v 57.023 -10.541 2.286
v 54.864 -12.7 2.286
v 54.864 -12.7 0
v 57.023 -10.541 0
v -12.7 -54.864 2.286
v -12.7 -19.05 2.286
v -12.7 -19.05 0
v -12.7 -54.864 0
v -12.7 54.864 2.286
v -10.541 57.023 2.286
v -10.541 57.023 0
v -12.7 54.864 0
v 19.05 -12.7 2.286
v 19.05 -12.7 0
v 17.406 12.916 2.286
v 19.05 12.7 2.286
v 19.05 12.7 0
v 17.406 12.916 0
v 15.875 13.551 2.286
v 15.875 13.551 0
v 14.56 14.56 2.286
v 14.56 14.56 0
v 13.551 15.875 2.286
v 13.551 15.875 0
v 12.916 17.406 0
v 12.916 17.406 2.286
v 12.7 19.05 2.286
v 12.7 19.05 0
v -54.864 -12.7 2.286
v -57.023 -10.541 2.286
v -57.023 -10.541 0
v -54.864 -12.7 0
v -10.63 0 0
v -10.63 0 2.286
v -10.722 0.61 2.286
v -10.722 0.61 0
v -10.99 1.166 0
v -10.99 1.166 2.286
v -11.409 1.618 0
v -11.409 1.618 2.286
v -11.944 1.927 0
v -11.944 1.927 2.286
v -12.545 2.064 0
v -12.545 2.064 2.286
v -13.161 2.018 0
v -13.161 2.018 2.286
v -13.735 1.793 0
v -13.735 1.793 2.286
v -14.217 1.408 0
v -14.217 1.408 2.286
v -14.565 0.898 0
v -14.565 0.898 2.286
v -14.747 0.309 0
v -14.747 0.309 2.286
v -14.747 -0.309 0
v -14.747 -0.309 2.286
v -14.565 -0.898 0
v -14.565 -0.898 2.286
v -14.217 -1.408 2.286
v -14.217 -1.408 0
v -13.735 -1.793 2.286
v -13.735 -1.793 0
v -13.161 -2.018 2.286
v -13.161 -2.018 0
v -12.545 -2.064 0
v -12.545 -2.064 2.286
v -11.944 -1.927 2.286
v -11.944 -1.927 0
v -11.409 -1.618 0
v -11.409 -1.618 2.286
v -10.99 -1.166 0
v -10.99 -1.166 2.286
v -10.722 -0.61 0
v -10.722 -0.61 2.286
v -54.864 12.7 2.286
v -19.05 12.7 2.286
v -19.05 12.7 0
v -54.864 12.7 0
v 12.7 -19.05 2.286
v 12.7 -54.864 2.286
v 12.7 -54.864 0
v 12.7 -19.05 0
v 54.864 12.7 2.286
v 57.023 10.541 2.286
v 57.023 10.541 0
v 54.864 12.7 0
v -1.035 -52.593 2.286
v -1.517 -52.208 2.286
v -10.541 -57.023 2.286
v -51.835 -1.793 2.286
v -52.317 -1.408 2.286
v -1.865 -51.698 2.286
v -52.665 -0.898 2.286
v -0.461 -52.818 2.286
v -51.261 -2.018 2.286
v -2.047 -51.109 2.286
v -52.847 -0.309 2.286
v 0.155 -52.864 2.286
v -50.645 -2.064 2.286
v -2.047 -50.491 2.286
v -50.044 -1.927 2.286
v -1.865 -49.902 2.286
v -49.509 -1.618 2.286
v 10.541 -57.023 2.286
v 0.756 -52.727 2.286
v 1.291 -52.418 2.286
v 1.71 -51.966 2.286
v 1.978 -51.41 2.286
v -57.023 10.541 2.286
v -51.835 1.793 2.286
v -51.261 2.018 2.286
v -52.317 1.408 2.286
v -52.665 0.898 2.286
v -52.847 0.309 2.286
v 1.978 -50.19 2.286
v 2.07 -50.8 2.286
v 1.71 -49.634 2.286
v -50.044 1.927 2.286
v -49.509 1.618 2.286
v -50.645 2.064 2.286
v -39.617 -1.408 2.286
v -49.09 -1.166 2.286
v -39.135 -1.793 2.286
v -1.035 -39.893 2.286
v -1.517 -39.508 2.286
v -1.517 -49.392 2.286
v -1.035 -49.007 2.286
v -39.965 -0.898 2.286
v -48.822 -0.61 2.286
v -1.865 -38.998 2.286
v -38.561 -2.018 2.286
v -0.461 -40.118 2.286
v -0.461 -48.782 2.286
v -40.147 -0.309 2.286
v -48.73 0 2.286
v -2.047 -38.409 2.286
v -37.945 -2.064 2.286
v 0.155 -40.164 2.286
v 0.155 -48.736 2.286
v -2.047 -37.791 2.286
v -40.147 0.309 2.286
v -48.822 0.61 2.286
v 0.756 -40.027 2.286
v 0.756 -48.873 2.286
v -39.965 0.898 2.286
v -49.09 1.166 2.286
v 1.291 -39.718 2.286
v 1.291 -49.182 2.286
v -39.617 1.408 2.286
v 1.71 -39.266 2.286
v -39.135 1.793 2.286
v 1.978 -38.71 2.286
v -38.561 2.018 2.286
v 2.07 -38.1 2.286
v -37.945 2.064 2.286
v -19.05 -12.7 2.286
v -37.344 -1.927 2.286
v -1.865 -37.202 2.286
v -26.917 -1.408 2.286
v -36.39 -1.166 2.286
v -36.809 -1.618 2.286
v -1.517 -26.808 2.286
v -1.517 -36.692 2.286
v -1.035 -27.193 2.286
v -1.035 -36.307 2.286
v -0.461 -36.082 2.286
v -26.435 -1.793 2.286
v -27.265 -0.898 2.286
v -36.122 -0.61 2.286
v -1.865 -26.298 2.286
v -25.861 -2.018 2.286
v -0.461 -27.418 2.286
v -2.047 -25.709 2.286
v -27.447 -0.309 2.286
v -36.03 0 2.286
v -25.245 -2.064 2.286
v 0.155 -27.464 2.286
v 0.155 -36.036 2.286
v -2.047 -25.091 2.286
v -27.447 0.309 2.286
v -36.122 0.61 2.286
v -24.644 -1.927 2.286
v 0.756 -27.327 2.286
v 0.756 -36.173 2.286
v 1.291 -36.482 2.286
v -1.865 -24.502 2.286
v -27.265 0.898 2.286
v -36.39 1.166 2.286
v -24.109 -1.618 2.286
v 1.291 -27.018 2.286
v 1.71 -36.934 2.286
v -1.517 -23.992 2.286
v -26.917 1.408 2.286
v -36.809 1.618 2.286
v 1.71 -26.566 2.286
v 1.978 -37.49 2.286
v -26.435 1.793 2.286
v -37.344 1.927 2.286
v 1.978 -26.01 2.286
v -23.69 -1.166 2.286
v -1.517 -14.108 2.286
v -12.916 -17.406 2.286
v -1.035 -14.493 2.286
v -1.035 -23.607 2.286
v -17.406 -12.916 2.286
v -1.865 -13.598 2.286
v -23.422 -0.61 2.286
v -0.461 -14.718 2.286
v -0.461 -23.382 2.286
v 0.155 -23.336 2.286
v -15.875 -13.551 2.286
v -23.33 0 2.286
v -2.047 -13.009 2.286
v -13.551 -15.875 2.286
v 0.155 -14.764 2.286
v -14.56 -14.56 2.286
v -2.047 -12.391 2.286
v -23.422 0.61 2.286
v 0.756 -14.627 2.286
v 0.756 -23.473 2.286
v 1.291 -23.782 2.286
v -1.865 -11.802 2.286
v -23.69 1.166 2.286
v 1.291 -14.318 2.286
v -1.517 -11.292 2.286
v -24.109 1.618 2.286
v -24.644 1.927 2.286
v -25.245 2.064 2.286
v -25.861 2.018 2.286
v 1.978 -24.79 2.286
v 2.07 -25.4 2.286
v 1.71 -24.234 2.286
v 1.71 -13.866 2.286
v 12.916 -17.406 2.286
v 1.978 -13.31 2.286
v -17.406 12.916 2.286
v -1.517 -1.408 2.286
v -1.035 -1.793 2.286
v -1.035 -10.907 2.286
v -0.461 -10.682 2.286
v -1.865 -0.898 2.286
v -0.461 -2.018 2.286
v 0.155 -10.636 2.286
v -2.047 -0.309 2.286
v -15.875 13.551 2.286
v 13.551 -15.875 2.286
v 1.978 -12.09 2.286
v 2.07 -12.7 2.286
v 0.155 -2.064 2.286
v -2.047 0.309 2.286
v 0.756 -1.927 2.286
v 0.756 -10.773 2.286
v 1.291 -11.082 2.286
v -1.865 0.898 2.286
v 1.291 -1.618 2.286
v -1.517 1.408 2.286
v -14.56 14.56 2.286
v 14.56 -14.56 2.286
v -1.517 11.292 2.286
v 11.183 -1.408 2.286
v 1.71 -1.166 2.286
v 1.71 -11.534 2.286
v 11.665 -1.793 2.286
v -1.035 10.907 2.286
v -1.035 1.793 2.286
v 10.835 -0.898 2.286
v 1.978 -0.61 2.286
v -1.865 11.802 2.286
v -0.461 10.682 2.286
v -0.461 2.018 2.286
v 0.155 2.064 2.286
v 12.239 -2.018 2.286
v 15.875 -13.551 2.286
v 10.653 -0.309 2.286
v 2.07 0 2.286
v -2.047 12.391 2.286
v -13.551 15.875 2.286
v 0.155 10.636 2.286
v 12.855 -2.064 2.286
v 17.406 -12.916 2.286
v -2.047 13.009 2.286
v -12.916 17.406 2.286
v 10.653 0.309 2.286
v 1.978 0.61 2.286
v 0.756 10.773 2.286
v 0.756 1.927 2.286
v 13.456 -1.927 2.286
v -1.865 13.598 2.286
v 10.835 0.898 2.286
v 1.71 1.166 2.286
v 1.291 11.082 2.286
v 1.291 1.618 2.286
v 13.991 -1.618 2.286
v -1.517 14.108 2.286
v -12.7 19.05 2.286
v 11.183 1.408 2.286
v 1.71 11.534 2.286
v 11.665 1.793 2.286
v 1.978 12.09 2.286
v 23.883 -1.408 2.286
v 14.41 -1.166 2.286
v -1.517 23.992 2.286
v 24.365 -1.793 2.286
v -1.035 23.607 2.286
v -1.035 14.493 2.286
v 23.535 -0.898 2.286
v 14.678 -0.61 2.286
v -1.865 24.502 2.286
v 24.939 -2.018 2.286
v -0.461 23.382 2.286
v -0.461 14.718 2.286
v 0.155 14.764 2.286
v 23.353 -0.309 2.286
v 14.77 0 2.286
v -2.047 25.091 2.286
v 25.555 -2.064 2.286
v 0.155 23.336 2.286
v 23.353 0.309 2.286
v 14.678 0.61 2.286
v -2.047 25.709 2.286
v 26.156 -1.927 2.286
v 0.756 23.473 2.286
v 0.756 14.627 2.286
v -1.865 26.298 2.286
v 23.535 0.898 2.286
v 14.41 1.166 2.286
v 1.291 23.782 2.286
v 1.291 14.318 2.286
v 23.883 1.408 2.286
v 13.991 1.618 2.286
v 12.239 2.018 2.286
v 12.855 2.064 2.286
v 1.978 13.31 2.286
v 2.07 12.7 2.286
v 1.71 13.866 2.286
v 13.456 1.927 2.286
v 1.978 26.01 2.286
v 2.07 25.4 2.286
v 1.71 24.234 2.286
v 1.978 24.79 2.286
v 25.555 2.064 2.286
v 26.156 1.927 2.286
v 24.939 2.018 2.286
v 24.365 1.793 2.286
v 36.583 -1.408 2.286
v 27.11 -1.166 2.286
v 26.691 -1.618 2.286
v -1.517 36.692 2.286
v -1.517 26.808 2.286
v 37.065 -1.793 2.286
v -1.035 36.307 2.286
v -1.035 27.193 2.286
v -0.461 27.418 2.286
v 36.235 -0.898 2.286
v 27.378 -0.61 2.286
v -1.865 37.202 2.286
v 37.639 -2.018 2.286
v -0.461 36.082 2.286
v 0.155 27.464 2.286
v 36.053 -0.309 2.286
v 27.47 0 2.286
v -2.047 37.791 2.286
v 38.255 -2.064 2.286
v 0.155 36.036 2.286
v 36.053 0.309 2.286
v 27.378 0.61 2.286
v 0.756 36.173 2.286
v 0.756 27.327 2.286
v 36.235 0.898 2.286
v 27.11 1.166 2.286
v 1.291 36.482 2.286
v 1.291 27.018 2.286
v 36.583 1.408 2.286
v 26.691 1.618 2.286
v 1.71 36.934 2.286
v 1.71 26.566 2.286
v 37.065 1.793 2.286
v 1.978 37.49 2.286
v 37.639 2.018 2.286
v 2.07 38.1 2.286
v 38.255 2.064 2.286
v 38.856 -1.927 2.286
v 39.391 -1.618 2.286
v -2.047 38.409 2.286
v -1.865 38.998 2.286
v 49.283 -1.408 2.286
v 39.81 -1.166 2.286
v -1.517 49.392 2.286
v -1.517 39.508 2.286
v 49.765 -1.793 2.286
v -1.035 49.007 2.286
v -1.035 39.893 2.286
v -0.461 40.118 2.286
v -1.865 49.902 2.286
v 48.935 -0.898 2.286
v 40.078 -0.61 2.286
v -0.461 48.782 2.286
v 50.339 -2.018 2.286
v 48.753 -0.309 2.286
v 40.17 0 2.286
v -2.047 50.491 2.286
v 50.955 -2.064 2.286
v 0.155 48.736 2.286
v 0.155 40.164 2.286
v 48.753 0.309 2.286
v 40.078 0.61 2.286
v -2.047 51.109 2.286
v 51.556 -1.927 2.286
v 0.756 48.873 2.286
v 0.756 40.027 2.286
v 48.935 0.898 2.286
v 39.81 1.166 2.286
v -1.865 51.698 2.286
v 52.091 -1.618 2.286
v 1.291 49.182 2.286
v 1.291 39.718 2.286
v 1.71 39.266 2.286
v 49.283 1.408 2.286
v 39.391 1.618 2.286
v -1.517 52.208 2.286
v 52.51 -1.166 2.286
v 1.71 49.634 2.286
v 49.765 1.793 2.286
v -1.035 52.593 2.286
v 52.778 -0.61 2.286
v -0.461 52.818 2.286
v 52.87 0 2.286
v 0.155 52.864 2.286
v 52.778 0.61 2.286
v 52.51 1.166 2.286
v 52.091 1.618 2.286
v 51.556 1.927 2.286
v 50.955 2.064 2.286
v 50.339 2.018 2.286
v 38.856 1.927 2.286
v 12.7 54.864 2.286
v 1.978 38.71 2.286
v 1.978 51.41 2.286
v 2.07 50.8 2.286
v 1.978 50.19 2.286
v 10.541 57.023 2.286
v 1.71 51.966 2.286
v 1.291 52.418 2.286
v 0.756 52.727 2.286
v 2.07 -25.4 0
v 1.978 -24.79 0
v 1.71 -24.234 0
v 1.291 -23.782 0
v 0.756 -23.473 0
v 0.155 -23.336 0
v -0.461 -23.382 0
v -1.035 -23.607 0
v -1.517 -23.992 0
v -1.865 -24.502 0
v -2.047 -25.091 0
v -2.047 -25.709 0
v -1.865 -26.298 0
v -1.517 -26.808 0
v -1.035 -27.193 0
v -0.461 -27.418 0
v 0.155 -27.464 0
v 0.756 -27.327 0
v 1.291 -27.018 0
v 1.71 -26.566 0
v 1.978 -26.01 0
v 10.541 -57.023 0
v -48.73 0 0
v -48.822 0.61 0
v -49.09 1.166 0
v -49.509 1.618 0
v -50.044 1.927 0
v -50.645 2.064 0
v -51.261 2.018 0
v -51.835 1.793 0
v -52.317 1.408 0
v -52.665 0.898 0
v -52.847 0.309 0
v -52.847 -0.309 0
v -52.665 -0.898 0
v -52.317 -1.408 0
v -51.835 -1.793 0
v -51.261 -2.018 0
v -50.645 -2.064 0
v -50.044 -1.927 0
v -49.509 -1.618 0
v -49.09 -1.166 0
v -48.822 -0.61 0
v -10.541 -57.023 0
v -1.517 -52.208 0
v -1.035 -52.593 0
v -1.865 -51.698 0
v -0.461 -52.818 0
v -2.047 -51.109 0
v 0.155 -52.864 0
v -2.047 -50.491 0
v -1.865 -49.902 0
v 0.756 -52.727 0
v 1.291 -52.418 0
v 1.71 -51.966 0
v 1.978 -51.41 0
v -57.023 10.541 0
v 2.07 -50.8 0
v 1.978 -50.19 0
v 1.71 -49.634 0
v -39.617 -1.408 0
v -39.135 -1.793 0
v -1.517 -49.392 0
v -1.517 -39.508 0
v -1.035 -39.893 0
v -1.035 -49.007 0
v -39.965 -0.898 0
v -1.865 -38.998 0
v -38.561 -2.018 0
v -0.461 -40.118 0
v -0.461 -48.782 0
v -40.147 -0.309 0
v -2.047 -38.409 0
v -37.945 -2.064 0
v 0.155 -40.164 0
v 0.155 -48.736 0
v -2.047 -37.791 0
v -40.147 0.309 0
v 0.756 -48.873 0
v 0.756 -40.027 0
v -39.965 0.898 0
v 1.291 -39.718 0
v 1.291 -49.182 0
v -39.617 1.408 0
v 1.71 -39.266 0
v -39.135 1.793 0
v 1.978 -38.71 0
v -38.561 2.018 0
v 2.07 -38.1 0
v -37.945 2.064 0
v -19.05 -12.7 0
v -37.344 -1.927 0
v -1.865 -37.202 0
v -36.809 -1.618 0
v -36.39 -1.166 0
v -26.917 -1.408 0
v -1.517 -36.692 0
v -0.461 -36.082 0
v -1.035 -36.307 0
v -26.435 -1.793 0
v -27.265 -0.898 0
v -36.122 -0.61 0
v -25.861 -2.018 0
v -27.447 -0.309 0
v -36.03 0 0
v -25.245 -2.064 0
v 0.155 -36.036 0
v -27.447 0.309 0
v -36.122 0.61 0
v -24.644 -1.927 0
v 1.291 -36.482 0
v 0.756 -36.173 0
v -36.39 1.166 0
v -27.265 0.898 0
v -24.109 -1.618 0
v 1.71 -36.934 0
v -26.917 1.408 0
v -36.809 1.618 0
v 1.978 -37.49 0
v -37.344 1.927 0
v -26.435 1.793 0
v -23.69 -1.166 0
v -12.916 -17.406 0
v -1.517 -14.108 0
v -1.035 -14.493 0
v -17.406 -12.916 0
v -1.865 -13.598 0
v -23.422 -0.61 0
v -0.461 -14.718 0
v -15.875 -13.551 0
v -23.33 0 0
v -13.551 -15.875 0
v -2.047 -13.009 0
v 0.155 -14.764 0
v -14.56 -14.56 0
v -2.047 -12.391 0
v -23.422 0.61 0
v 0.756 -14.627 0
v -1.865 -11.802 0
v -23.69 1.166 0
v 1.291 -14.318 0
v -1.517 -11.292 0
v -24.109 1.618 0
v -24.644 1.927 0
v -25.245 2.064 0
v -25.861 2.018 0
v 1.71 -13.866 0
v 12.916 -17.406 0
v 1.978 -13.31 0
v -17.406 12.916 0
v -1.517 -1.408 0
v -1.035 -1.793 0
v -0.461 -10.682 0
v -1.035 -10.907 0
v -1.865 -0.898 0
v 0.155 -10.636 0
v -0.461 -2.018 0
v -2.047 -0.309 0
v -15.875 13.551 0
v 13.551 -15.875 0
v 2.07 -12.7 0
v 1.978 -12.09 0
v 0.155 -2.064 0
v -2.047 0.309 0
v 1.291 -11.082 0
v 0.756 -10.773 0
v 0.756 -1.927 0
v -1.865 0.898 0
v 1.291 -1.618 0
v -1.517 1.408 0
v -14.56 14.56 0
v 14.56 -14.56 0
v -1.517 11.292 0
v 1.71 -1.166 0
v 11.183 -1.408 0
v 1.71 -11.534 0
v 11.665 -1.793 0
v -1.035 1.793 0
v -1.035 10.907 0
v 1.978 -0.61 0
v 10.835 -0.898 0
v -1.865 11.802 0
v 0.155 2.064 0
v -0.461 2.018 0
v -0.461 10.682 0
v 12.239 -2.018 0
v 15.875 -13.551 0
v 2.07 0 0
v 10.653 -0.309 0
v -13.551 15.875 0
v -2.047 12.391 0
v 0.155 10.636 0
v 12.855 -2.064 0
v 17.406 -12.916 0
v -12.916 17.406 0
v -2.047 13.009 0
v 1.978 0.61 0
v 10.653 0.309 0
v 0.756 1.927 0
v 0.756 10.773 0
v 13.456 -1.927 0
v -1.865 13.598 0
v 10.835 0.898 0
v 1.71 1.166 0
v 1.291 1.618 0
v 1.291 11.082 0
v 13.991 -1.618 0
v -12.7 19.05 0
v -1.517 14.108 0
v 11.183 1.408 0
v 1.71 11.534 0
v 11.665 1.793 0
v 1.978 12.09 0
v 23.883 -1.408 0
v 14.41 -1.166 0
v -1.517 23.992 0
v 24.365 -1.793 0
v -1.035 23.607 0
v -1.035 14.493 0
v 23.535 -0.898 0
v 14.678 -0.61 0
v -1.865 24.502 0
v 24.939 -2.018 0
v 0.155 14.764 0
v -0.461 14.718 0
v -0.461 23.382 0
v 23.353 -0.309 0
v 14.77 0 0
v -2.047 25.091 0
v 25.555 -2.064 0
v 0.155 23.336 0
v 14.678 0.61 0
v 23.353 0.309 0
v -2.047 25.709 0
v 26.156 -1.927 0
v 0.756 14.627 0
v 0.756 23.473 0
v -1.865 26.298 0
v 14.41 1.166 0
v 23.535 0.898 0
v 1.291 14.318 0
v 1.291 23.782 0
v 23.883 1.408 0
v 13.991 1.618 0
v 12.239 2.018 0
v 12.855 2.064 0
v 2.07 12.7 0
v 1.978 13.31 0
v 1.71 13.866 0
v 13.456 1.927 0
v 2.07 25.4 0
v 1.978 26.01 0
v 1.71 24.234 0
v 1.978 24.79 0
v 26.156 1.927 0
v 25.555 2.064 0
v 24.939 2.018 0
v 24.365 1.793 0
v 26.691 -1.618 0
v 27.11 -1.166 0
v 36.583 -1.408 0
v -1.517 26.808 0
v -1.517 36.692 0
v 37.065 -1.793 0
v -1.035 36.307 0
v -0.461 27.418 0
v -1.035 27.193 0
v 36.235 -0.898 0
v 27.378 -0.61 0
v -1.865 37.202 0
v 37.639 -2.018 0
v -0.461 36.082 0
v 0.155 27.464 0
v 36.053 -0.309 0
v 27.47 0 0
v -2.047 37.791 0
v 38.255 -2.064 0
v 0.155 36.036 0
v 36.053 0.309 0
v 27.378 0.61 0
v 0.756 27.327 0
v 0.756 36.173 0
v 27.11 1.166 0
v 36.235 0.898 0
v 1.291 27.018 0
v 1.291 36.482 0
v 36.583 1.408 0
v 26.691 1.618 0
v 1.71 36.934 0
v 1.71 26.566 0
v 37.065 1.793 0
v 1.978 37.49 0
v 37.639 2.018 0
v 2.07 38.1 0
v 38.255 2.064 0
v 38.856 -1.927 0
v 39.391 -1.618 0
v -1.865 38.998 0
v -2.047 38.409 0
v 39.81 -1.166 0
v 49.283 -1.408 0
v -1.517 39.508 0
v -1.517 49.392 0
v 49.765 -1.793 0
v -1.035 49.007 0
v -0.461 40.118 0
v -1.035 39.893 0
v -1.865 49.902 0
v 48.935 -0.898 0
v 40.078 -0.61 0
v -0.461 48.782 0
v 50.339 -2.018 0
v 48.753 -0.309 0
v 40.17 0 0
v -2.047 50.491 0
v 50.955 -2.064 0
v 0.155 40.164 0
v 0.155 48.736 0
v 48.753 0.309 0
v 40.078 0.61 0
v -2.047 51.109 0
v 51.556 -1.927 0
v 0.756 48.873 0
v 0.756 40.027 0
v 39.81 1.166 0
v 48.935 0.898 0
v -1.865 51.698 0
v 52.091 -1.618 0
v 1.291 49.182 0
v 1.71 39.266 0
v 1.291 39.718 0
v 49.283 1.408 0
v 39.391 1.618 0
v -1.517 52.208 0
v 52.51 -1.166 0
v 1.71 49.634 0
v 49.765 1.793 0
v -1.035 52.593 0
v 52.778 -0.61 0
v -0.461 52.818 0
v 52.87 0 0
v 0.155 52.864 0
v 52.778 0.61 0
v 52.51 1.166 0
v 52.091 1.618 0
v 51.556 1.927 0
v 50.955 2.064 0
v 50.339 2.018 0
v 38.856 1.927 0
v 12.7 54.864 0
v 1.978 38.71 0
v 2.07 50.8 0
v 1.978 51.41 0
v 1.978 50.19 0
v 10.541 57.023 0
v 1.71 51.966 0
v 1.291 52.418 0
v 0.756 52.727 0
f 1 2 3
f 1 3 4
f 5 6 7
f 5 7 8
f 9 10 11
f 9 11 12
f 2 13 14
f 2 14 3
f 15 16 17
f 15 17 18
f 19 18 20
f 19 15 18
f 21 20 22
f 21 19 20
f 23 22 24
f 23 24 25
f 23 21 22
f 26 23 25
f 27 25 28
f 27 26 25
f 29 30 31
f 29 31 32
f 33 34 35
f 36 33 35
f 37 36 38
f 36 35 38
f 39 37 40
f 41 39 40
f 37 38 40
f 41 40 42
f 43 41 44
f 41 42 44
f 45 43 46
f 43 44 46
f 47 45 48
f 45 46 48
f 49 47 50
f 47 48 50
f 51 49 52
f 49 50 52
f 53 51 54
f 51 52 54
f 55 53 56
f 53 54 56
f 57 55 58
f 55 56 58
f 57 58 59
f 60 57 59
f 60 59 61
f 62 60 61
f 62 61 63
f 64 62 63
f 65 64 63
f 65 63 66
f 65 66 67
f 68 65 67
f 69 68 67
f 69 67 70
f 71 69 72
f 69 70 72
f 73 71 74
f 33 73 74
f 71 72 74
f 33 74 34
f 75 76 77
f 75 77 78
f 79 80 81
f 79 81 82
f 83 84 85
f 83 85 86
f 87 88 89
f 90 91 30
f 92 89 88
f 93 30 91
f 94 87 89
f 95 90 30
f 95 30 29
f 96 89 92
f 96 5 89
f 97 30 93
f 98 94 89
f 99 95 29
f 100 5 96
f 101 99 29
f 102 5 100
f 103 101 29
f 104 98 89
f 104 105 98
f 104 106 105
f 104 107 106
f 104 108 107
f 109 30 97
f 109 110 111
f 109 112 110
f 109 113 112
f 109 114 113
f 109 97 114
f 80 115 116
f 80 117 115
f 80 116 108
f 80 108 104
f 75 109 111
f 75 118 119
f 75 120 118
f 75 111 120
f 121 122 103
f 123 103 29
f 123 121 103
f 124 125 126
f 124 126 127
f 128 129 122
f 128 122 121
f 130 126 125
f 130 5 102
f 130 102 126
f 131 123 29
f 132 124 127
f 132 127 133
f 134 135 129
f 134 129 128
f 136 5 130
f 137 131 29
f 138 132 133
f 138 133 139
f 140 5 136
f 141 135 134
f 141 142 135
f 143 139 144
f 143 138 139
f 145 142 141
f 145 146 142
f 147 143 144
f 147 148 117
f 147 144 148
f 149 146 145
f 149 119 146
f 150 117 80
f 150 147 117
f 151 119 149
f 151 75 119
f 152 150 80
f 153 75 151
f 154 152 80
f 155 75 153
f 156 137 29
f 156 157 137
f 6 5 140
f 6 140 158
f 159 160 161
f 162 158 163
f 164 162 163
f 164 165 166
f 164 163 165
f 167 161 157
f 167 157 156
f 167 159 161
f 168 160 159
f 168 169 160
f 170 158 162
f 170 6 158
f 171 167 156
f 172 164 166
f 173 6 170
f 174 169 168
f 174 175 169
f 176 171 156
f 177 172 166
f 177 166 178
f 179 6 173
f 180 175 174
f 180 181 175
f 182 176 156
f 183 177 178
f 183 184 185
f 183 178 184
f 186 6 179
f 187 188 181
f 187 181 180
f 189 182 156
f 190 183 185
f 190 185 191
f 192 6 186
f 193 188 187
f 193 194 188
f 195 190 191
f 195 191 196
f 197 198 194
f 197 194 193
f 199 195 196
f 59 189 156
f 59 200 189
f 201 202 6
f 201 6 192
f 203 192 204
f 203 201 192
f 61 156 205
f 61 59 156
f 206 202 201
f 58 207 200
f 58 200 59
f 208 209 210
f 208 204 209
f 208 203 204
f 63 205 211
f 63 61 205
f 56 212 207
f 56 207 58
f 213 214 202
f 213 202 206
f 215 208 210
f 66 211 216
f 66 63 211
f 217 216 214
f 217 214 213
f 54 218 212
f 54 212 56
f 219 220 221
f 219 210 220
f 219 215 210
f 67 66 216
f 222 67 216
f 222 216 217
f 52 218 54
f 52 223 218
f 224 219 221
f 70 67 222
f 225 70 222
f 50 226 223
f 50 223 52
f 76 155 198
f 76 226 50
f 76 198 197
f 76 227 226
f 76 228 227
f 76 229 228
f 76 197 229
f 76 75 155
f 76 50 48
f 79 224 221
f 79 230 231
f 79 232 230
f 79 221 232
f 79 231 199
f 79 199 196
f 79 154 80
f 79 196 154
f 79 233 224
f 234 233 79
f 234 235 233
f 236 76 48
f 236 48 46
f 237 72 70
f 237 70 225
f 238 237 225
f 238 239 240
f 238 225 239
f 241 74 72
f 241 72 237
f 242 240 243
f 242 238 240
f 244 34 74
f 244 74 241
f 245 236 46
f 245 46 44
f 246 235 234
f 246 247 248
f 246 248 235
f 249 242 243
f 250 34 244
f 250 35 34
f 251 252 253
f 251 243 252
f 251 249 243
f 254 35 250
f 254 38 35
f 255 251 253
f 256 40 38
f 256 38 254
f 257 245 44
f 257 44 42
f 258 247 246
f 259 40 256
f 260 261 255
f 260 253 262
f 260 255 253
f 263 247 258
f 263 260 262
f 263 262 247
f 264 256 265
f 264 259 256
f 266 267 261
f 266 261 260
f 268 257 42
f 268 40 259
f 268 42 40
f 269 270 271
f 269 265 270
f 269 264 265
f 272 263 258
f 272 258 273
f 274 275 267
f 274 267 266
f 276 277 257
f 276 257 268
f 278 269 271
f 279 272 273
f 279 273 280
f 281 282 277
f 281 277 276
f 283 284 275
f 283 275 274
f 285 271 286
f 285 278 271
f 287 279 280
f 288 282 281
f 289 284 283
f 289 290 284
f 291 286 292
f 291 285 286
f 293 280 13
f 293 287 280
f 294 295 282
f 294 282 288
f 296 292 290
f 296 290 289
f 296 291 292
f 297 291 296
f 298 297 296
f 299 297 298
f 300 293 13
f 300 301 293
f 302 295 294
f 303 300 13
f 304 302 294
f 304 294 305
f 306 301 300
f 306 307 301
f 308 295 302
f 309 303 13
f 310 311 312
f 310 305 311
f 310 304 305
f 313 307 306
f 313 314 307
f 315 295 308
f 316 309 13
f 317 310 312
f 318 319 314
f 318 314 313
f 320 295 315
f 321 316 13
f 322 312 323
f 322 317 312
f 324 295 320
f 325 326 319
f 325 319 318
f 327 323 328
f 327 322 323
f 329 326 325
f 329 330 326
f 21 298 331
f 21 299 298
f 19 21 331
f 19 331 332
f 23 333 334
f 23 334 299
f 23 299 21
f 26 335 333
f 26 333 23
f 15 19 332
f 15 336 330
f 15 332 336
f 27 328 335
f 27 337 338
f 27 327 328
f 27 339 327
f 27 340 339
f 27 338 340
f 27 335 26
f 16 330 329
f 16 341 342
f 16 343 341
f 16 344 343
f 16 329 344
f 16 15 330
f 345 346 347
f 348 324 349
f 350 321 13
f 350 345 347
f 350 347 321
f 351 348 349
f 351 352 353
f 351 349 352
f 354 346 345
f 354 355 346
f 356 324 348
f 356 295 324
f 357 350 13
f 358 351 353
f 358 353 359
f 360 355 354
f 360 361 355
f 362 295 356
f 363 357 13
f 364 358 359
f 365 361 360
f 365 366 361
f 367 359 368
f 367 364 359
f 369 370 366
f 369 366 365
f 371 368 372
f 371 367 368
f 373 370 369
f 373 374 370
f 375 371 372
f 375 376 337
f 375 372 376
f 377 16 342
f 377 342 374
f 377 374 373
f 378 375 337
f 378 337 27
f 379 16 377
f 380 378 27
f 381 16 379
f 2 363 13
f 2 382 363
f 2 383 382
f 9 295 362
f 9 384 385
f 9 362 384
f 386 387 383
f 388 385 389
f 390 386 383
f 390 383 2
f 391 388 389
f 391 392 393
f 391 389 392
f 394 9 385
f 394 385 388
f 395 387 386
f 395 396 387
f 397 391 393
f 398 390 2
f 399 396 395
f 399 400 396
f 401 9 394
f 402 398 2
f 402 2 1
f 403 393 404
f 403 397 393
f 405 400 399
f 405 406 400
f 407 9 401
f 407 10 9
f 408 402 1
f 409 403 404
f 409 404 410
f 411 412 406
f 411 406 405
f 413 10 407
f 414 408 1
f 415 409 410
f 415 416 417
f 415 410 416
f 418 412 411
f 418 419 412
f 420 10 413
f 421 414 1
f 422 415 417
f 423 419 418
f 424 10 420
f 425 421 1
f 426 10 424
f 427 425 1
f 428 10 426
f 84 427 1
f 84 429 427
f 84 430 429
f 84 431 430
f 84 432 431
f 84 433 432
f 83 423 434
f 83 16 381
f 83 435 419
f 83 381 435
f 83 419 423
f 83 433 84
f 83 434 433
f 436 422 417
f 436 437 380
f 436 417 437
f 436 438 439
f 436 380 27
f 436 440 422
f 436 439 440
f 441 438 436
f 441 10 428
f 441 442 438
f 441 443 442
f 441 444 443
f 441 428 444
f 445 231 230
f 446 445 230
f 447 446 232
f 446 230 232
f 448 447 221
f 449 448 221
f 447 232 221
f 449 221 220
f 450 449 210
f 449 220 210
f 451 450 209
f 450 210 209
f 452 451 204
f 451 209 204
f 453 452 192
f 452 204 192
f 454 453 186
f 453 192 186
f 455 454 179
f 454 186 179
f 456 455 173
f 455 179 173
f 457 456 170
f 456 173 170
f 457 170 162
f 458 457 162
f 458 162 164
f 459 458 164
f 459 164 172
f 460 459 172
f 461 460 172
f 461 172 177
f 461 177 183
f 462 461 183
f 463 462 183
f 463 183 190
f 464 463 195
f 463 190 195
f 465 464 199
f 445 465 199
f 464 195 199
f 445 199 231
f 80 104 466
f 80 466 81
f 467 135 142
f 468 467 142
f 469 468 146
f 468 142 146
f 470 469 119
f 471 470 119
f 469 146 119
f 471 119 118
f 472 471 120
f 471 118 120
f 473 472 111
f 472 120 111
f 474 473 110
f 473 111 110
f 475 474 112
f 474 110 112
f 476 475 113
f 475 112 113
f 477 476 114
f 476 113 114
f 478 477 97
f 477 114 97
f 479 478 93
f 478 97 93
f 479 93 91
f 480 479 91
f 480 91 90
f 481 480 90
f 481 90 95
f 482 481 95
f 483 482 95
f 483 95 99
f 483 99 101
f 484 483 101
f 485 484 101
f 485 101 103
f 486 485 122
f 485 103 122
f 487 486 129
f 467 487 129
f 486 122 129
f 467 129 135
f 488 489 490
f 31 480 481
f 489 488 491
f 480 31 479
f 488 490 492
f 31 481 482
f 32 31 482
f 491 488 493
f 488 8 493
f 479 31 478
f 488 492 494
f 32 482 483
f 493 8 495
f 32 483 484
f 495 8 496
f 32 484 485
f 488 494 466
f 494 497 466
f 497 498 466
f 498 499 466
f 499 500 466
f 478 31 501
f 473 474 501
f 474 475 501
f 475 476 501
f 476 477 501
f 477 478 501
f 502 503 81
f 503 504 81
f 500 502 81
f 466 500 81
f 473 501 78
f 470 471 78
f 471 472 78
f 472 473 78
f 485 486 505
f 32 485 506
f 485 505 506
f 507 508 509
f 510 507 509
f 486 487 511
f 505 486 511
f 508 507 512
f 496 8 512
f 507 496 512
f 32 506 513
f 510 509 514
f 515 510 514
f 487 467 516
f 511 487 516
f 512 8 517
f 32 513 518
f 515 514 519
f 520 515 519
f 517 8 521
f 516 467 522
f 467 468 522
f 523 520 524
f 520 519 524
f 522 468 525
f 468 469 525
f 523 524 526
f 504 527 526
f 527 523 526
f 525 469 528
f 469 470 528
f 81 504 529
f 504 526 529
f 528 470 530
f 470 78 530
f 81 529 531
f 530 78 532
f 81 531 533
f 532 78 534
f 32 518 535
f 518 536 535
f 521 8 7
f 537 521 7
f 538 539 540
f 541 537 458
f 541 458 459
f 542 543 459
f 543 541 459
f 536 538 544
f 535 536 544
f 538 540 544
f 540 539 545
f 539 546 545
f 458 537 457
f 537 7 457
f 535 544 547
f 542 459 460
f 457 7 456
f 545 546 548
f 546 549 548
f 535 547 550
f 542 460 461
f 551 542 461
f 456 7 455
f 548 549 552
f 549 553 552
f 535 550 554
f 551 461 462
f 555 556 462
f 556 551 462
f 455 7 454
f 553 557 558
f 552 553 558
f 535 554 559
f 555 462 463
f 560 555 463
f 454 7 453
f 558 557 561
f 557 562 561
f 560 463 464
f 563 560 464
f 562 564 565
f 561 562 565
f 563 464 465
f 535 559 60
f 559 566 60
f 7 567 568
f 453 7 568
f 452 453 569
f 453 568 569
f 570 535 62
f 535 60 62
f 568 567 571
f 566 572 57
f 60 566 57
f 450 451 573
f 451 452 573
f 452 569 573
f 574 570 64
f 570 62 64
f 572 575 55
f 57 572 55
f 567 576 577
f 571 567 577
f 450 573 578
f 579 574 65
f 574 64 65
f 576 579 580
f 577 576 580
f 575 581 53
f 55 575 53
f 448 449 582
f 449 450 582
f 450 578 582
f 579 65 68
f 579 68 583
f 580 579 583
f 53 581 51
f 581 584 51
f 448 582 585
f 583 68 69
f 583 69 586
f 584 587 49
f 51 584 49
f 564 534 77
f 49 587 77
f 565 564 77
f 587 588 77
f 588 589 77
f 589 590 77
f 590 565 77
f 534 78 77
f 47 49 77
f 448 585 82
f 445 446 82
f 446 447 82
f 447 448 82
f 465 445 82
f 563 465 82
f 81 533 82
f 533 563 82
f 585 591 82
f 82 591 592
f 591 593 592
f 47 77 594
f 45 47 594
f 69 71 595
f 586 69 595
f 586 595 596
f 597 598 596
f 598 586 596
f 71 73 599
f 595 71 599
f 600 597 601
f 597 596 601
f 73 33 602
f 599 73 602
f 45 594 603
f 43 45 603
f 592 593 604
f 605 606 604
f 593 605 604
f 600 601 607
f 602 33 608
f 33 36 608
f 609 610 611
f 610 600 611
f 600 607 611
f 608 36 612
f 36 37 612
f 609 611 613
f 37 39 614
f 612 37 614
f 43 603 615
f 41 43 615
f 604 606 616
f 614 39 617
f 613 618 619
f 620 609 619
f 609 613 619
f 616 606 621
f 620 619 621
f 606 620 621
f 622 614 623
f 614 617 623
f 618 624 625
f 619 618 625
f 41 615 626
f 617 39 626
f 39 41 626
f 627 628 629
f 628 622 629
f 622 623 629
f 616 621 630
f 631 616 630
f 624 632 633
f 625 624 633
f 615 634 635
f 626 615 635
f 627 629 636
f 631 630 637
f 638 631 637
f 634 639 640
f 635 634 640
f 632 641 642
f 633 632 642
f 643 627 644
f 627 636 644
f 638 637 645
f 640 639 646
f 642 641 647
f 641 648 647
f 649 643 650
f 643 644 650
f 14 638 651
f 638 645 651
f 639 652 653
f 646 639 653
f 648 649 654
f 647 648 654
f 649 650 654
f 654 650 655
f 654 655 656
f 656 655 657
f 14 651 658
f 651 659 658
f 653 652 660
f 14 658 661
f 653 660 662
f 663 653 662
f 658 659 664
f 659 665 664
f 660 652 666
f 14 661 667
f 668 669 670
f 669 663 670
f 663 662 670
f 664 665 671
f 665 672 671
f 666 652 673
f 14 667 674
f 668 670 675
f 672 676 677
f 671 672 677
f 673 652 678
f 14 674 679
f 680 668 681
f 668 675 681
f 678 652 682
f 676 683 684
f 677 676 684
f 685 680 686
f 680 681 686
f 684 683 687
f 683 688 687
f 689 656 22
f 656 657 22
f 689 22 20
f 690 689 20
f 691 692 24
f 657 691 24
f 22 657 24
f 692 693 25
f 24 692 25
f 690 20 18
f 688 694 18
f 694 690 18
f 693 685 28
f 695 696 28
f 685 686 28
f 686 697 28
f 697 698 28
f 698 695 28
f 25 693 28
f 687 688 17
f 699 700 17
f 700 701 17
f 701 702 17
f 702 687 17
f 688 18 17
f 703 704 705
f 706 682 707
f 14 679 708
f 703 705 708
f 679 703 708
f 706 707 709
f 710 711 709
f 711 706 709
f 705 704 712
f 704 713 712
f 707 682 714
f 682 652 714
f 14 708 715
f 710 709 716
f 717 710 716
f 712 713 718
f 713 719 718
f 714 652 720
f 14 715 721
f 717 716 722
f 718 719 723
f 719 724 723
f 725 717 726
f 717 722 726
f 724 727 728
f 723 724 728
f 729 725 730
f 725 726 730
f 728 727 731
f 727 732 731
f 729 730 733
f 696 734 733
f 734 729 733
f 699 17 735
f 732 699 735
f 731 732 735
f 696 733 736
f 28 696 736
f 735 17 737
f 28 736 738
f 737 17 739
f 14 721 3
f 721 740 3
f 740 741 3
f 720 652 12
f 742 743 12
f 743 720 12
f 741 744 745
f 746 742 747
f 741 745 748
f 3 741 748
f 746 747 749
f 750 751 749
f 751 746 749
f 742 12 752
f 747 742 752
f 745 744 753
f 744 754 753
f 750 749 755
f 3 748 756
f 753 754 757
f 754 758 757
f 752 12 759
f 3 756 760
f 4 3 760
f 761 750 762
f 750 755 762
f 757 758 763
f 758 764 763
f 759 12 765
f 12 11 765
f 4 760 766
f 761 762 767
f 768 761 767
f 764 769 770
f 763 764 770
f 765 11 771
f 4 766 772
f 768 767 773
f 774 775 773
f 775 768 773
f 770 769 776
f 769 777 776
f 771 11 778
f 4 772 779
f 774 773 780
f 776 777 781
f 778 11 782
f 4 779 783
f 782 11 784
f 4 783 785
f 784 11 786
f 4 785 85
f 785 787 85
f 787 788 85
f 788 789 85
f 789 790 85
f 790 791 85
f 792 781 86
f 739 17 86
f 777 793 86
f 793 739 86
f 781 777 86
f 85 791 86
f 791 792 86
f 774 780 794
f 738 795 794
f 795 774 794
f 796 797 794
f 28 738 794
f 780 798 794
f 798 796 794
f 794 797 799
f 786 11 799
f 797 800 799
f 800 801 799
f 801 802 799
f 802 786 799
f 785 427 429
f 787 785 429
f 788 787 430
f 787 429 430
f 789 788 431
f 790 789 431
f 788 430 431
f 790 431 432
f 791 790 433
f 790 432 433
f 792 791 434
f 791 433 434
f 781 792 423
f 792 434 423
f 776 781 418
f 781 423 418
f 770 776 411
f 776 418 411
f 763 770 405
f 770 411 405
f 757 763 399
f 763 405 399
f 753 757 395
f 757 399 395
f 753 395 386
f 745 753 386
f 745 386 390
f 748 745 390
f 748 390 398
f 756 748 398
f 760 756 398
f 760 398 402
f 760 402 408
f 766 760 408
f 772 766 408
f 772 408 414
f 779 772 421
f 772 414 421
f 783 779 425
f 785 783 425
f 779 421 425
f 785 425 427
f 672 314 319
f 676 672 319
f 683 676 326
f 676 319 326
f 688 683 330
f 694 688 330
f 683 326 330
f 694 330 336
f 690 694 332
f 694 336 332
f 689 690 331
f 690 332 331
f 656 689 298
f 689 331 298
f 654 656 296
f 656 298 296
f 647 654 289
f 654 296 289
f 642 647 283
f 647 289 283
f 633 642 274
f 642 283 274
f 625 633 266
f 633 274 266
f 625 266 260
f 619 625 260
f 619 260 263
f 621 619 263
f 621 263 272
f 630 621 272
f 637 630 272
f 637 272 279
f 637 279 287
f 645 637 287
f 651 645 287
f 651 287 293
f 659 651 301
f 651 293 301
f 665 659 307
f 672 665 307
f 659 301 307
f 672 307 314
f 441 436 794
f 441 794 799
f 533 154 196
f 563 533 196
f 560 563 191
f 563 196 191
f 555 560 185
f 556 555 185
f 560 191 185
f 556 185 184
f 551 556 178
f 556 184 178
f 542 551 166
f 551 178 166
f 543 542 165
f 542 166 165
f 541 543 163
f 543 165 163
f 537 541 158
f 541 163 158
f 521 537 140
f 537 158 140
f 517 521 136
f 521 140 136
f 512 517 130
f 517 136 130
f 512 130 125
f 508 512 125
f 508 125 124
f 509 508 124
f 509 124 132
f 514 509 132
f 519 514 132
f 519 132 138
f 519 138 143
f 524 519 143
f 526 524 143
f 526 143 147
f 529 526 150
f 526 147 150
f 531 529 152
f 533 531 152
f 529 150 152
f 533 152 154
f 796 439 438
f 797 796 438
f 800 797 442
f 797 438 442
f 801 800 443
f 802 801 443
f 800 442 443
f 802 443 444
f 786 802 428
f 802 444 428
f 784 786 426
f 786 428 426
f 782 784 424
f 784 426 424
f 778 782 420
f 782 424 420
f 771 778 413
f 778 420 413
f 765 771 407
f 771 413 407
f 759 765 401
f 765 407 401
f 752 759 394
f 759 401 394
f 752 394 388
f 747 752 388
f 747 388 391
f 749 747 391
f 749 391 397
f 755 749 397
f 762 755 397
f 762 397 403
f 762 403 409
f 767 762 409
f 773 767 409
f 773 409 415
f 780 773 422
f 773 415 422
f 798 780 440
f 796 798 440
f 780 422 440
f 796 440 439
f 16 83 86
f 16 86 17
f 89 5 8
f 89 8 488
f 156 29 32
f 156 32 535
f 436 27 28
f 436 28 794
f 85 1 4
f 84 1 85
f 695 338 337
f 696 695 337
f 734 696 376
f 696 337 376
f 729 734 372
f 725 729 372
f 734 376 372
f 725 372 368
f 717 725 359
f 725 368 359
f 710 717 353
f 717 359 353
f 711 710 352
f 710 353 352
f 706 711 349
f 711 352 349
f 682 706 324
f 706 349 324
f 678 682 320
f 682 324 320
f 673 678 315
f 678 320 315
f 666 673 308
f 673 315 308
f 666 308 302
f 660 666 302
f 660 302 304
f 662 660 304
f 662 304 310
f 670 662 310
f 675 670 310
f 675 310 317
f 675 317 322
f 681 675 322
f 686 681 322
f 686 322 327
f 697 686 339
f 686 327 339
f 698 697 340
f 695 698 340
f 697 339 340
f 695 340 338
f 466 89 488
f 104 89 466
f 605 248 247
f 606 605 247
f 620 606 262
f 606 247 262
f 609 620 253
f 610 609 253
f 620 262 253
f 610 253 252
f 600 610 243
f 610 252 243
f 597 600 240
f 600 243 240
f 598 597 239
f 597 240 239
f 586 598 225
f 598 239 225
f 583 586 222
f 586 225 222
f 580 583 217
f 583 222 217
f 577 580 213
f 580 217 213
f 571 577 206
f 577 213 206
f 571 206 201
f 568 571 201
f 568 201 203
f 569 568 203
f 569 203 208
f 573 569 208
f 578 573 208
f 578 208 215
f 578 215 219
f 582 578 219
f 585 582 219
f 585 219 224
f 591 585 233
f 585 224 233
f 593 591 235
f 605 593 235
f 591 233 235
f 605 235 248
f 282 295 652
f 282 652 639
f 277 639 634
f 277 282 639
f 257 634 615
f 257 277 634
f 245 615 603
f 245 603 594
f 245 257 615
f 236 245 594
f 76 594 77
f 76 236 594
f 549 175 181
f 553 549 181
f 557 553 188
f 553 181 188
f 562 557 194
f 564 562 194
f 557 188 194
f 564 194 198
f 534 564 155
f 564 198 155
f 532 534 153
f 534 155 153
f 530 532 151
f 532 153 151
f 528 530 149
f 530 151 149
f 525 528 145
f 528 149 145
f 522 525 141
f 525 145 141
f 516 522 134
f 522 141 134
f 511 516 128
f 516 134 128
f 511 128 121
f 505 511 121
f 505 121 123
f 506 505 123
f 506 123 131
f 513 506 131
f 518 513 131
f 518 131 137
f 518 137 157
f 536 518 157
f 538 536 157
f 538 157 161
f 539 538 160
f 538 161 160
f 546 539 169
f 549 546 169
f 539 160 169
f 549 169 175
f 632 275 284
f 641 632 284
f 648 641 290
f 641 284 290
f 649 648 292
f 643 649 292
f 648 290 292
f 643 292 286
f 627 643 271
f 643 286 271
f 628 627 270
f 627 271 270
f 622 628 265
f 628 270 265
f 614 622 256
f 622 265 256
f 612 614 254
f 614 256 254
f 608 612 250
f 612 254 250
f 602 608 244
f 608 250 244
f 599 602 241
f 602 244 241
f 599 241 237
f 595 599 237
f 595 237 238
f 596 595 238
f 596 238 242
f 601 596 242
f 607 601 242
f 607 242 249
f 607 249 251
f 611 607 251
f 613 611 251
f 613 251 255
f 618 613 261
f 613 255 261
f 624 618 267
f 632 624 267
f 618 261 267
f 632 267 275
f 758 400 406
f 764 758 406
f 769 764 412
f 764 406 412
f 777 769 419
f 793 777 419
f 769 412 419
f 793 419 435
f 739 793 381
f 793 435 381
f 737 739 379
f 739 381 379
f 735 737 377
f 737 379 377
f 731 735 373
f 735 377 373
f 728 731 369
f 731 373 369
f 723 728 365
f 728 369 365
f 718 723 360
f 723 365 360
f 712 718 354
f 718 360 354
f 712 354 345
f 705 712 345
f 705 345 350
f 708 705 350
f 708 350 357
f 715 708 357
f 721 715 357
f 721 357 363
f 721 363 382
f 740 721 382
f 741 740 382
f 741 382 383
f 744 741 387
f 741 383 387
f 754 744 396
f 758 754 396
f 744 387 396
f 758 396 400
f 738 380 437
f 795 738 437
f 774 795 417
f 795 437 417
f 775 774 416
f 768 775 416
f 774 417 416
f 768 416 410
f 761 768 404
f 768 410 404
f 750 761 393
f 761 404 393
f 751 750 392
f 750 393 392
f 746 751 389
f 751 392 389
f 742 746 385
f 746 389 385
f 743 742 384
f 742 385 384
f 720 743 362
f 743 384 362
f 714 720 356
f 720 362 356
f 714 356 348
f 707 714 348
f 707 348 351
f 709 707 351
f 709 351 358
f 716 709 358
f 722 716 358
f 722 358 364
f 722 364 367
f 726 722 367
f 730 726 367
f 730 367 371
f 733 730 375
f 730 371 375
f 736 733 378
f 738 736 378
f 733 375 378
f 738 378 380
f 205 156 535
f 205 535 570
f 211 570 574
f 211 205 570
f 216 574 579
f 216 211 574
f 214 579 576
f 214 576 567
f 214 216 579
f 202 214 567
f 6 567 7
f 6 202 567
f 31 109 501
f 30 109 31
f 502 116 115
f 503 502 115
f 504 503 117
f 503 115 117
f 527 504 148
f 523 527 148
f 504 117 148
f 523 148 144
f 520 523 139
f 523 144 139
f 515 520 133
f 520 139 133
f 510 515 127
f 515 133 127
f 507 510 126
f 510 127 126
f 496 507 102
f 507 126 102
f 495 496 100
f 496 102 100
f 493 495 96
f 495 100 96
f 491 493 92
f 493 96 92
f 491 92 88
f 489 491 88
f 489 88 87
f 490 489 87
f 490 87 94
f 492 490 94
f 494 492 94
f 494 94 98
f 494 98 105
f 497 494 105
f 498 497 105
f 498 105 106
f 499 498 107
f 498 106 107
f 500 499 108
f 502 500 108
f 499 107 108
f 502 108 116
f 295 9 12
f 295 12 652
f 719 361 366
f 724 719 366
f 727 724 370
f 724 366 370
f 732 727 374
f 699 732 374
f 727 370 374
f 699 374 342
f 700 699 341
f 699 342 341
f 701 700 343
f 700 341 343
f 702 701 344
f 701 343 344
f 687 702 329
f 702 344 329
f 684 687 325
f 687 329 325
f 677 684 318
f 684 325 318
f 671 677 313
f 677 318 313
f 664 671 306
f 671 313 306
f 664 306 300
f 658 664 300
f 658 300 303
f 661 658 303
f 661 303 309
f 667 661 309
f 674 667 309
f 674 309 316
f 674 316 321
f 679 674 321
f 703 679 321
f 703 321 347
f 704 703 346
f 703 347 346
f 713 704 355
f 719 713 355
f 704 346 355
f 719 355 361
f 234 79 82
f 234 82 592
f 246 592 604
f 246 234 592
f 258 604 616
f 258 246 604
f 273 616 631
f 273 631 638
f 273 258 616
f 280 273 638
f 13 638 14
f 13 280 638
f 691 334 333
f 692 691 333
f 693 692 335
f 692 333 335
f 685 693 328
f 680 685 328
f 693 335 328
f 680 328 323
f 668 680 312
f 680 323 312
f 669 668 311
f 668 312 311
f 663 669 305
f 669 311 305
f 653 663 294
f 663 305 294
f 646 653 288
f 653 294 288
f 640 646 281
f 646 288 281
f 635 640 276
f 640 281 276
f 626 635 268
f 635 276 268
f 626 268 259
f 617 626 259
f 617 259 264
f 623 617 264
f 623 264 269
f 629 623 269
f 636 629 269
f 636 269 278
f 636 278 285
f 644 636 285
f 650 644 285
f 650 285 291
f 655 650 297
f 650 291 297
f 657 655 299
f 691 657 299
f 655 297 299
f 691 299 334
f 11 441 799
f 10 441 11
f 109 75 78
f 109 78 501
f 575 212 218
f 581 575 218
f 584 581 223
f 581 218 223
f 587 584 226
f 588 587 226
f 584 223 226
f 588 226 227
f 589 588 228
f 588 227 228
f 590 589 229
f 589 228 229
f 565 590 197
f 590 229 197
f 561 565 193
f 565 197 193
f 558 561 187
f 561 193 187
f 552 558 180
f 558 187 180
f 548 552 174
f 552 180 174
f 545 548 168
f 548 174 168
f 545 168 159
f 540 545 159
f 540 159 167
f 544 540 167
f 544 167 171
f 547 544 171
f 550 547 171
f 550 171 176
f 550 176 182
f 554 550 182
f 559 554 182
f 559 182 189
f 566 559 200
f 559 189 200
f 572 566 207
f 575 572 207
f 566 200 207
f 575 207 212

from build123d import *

# Parameters (mm, degrees)
SKETCH1_R           = 2.0701
BOSS_EXTRUDE1_DEPTH = 2.286


with BuildPart() as part:
    # Sketch1 → Boss-Extrude1 (new body)
    with BuildSketch(Plane.XY.offset(2.286)):
        with BuildLine():
            Line((57.023, 10.541), (54.864, 12.7))
            Line((54.864, 12.7), (19.05, 12.7))
            ThreePointArc((19.05, 12.7), (14.559871939, 14.559871939), (12.7, 19.05))
            Line((12.7, 19.05), (12.7, 54.864))
            Line((12.7, 54.864), (10.541, 57.023))
            Line((10.541, 57.023), (-10.541, 57.023))
            Line((-10.541, 57.023), (-12.7, 54.864))
            Line((-12.7, 54.864), (-12.7, 19.05))
            ThreePointArc((-12.7, 19.05), (-14.559871939, 14.559871939), (-19.05, 12.7))
            Line((-19.05, 12.7), (-54.864, 12.7))
            Line((-54.864, 12.7), (-57.023, 10.541))
            Line((-57.023, 10.541), (-57.023, -10.541))
            Line((-57.023, -10.541), (-54.864, -12.7))
            Line((-54.864, -12.7), (-19.05, -12.7))
            ThreePointArc((-19.05, -12.7), (-14.559871939, -14.559871939), (-12.7, -19.05))
            Line((-12.7, -19.05), (-12.7, -54.864))
            Line((-12.7, -54.864), (-10.541, -57.023))
            Line((-10.541, -57.023), (10.541, -57.023))
            Line((10.541, -57.023), (12.7, -54.864))
            Line((12.7, -54.864), (12.7, -19.05))
            ThreePointArc((12.7, -19.05), (14.559871939, -14.559871939), (19.05, -12.7))
            Line((19.05, -12.7), (54.864, -12.7))
            Line((54.864, -12.7), (57.023, -10.541))
            Line((57.023, -10.541), (57.023, 10.541))
        make_face()
        with Locations((0, 12.7)):
            Circle(SKETCH1_R, mode=Mode.SUBTRACT)
        with Locations((0, 38.1)):
            Circle(SKETCH1_R, mode=Mode.SUBTRACT)
        with Locations((-12.7, 0)):
            Circle(SKETCH1_R, mode=Mode.SUBTRACT)
        with Locations((-38.1, 0)):
            Circle(SKETCH1_R, mode=Mode.SUBTRACT)
        with Locations((50.8, 0)):
            Circle(SKETCH1_R, mode=Mode.SUBTRACT)
        with Locations((0, -38.1)):
            Circle(SKETCH1_R, mode=Mode.SUBTRACT)
        with Locations((0, -12.7)):
            Circle(SKETCH1_R, mode=Mode.SUBTRACT)
        with Locations((25.4, 0)):
            Circle(SKETCH1_R, mode=Mode.SUBTRACT)
        Circle(SKETCH1_R, mode=Mode.SUBTRACT)
        with Locations((12.7, 0)):
            Circle(SKETCH1_R, mode=Mode.SUBTRACT)
        with Locations((38.1, 0)):
            Circle(SKETCH1_R, mode=Mode.SUBTRACT)
        with Locations((0, -25.4)):
            Circle(SKETCH1_R, mode=Mode.SUBTRACT)
        with Locations((0, -50.8)):
            Circle(SKETCH1_R, mode=Mode.SUBTRACT)
        with Locations((-50.8, 0)):
            Circle(SKETCH1_R, mode=Mode.SUBTRACT)
        with Locations((-25.4, 0)):
            Circle(SKETCH1_R, mode=Mode.SUBTRACT)
        with Locations((0, 50.8)):
            Circle(SKETCH1_R, mode=Mode.SUBTRACT)
        with Locations((0, 25.4)):
            Circle(SKETCH1_R, mode=Mode.SUBTRACT)
    extrude(amount=-BOSS_EXTRUDE1_DEPTH)


solid = part.part
